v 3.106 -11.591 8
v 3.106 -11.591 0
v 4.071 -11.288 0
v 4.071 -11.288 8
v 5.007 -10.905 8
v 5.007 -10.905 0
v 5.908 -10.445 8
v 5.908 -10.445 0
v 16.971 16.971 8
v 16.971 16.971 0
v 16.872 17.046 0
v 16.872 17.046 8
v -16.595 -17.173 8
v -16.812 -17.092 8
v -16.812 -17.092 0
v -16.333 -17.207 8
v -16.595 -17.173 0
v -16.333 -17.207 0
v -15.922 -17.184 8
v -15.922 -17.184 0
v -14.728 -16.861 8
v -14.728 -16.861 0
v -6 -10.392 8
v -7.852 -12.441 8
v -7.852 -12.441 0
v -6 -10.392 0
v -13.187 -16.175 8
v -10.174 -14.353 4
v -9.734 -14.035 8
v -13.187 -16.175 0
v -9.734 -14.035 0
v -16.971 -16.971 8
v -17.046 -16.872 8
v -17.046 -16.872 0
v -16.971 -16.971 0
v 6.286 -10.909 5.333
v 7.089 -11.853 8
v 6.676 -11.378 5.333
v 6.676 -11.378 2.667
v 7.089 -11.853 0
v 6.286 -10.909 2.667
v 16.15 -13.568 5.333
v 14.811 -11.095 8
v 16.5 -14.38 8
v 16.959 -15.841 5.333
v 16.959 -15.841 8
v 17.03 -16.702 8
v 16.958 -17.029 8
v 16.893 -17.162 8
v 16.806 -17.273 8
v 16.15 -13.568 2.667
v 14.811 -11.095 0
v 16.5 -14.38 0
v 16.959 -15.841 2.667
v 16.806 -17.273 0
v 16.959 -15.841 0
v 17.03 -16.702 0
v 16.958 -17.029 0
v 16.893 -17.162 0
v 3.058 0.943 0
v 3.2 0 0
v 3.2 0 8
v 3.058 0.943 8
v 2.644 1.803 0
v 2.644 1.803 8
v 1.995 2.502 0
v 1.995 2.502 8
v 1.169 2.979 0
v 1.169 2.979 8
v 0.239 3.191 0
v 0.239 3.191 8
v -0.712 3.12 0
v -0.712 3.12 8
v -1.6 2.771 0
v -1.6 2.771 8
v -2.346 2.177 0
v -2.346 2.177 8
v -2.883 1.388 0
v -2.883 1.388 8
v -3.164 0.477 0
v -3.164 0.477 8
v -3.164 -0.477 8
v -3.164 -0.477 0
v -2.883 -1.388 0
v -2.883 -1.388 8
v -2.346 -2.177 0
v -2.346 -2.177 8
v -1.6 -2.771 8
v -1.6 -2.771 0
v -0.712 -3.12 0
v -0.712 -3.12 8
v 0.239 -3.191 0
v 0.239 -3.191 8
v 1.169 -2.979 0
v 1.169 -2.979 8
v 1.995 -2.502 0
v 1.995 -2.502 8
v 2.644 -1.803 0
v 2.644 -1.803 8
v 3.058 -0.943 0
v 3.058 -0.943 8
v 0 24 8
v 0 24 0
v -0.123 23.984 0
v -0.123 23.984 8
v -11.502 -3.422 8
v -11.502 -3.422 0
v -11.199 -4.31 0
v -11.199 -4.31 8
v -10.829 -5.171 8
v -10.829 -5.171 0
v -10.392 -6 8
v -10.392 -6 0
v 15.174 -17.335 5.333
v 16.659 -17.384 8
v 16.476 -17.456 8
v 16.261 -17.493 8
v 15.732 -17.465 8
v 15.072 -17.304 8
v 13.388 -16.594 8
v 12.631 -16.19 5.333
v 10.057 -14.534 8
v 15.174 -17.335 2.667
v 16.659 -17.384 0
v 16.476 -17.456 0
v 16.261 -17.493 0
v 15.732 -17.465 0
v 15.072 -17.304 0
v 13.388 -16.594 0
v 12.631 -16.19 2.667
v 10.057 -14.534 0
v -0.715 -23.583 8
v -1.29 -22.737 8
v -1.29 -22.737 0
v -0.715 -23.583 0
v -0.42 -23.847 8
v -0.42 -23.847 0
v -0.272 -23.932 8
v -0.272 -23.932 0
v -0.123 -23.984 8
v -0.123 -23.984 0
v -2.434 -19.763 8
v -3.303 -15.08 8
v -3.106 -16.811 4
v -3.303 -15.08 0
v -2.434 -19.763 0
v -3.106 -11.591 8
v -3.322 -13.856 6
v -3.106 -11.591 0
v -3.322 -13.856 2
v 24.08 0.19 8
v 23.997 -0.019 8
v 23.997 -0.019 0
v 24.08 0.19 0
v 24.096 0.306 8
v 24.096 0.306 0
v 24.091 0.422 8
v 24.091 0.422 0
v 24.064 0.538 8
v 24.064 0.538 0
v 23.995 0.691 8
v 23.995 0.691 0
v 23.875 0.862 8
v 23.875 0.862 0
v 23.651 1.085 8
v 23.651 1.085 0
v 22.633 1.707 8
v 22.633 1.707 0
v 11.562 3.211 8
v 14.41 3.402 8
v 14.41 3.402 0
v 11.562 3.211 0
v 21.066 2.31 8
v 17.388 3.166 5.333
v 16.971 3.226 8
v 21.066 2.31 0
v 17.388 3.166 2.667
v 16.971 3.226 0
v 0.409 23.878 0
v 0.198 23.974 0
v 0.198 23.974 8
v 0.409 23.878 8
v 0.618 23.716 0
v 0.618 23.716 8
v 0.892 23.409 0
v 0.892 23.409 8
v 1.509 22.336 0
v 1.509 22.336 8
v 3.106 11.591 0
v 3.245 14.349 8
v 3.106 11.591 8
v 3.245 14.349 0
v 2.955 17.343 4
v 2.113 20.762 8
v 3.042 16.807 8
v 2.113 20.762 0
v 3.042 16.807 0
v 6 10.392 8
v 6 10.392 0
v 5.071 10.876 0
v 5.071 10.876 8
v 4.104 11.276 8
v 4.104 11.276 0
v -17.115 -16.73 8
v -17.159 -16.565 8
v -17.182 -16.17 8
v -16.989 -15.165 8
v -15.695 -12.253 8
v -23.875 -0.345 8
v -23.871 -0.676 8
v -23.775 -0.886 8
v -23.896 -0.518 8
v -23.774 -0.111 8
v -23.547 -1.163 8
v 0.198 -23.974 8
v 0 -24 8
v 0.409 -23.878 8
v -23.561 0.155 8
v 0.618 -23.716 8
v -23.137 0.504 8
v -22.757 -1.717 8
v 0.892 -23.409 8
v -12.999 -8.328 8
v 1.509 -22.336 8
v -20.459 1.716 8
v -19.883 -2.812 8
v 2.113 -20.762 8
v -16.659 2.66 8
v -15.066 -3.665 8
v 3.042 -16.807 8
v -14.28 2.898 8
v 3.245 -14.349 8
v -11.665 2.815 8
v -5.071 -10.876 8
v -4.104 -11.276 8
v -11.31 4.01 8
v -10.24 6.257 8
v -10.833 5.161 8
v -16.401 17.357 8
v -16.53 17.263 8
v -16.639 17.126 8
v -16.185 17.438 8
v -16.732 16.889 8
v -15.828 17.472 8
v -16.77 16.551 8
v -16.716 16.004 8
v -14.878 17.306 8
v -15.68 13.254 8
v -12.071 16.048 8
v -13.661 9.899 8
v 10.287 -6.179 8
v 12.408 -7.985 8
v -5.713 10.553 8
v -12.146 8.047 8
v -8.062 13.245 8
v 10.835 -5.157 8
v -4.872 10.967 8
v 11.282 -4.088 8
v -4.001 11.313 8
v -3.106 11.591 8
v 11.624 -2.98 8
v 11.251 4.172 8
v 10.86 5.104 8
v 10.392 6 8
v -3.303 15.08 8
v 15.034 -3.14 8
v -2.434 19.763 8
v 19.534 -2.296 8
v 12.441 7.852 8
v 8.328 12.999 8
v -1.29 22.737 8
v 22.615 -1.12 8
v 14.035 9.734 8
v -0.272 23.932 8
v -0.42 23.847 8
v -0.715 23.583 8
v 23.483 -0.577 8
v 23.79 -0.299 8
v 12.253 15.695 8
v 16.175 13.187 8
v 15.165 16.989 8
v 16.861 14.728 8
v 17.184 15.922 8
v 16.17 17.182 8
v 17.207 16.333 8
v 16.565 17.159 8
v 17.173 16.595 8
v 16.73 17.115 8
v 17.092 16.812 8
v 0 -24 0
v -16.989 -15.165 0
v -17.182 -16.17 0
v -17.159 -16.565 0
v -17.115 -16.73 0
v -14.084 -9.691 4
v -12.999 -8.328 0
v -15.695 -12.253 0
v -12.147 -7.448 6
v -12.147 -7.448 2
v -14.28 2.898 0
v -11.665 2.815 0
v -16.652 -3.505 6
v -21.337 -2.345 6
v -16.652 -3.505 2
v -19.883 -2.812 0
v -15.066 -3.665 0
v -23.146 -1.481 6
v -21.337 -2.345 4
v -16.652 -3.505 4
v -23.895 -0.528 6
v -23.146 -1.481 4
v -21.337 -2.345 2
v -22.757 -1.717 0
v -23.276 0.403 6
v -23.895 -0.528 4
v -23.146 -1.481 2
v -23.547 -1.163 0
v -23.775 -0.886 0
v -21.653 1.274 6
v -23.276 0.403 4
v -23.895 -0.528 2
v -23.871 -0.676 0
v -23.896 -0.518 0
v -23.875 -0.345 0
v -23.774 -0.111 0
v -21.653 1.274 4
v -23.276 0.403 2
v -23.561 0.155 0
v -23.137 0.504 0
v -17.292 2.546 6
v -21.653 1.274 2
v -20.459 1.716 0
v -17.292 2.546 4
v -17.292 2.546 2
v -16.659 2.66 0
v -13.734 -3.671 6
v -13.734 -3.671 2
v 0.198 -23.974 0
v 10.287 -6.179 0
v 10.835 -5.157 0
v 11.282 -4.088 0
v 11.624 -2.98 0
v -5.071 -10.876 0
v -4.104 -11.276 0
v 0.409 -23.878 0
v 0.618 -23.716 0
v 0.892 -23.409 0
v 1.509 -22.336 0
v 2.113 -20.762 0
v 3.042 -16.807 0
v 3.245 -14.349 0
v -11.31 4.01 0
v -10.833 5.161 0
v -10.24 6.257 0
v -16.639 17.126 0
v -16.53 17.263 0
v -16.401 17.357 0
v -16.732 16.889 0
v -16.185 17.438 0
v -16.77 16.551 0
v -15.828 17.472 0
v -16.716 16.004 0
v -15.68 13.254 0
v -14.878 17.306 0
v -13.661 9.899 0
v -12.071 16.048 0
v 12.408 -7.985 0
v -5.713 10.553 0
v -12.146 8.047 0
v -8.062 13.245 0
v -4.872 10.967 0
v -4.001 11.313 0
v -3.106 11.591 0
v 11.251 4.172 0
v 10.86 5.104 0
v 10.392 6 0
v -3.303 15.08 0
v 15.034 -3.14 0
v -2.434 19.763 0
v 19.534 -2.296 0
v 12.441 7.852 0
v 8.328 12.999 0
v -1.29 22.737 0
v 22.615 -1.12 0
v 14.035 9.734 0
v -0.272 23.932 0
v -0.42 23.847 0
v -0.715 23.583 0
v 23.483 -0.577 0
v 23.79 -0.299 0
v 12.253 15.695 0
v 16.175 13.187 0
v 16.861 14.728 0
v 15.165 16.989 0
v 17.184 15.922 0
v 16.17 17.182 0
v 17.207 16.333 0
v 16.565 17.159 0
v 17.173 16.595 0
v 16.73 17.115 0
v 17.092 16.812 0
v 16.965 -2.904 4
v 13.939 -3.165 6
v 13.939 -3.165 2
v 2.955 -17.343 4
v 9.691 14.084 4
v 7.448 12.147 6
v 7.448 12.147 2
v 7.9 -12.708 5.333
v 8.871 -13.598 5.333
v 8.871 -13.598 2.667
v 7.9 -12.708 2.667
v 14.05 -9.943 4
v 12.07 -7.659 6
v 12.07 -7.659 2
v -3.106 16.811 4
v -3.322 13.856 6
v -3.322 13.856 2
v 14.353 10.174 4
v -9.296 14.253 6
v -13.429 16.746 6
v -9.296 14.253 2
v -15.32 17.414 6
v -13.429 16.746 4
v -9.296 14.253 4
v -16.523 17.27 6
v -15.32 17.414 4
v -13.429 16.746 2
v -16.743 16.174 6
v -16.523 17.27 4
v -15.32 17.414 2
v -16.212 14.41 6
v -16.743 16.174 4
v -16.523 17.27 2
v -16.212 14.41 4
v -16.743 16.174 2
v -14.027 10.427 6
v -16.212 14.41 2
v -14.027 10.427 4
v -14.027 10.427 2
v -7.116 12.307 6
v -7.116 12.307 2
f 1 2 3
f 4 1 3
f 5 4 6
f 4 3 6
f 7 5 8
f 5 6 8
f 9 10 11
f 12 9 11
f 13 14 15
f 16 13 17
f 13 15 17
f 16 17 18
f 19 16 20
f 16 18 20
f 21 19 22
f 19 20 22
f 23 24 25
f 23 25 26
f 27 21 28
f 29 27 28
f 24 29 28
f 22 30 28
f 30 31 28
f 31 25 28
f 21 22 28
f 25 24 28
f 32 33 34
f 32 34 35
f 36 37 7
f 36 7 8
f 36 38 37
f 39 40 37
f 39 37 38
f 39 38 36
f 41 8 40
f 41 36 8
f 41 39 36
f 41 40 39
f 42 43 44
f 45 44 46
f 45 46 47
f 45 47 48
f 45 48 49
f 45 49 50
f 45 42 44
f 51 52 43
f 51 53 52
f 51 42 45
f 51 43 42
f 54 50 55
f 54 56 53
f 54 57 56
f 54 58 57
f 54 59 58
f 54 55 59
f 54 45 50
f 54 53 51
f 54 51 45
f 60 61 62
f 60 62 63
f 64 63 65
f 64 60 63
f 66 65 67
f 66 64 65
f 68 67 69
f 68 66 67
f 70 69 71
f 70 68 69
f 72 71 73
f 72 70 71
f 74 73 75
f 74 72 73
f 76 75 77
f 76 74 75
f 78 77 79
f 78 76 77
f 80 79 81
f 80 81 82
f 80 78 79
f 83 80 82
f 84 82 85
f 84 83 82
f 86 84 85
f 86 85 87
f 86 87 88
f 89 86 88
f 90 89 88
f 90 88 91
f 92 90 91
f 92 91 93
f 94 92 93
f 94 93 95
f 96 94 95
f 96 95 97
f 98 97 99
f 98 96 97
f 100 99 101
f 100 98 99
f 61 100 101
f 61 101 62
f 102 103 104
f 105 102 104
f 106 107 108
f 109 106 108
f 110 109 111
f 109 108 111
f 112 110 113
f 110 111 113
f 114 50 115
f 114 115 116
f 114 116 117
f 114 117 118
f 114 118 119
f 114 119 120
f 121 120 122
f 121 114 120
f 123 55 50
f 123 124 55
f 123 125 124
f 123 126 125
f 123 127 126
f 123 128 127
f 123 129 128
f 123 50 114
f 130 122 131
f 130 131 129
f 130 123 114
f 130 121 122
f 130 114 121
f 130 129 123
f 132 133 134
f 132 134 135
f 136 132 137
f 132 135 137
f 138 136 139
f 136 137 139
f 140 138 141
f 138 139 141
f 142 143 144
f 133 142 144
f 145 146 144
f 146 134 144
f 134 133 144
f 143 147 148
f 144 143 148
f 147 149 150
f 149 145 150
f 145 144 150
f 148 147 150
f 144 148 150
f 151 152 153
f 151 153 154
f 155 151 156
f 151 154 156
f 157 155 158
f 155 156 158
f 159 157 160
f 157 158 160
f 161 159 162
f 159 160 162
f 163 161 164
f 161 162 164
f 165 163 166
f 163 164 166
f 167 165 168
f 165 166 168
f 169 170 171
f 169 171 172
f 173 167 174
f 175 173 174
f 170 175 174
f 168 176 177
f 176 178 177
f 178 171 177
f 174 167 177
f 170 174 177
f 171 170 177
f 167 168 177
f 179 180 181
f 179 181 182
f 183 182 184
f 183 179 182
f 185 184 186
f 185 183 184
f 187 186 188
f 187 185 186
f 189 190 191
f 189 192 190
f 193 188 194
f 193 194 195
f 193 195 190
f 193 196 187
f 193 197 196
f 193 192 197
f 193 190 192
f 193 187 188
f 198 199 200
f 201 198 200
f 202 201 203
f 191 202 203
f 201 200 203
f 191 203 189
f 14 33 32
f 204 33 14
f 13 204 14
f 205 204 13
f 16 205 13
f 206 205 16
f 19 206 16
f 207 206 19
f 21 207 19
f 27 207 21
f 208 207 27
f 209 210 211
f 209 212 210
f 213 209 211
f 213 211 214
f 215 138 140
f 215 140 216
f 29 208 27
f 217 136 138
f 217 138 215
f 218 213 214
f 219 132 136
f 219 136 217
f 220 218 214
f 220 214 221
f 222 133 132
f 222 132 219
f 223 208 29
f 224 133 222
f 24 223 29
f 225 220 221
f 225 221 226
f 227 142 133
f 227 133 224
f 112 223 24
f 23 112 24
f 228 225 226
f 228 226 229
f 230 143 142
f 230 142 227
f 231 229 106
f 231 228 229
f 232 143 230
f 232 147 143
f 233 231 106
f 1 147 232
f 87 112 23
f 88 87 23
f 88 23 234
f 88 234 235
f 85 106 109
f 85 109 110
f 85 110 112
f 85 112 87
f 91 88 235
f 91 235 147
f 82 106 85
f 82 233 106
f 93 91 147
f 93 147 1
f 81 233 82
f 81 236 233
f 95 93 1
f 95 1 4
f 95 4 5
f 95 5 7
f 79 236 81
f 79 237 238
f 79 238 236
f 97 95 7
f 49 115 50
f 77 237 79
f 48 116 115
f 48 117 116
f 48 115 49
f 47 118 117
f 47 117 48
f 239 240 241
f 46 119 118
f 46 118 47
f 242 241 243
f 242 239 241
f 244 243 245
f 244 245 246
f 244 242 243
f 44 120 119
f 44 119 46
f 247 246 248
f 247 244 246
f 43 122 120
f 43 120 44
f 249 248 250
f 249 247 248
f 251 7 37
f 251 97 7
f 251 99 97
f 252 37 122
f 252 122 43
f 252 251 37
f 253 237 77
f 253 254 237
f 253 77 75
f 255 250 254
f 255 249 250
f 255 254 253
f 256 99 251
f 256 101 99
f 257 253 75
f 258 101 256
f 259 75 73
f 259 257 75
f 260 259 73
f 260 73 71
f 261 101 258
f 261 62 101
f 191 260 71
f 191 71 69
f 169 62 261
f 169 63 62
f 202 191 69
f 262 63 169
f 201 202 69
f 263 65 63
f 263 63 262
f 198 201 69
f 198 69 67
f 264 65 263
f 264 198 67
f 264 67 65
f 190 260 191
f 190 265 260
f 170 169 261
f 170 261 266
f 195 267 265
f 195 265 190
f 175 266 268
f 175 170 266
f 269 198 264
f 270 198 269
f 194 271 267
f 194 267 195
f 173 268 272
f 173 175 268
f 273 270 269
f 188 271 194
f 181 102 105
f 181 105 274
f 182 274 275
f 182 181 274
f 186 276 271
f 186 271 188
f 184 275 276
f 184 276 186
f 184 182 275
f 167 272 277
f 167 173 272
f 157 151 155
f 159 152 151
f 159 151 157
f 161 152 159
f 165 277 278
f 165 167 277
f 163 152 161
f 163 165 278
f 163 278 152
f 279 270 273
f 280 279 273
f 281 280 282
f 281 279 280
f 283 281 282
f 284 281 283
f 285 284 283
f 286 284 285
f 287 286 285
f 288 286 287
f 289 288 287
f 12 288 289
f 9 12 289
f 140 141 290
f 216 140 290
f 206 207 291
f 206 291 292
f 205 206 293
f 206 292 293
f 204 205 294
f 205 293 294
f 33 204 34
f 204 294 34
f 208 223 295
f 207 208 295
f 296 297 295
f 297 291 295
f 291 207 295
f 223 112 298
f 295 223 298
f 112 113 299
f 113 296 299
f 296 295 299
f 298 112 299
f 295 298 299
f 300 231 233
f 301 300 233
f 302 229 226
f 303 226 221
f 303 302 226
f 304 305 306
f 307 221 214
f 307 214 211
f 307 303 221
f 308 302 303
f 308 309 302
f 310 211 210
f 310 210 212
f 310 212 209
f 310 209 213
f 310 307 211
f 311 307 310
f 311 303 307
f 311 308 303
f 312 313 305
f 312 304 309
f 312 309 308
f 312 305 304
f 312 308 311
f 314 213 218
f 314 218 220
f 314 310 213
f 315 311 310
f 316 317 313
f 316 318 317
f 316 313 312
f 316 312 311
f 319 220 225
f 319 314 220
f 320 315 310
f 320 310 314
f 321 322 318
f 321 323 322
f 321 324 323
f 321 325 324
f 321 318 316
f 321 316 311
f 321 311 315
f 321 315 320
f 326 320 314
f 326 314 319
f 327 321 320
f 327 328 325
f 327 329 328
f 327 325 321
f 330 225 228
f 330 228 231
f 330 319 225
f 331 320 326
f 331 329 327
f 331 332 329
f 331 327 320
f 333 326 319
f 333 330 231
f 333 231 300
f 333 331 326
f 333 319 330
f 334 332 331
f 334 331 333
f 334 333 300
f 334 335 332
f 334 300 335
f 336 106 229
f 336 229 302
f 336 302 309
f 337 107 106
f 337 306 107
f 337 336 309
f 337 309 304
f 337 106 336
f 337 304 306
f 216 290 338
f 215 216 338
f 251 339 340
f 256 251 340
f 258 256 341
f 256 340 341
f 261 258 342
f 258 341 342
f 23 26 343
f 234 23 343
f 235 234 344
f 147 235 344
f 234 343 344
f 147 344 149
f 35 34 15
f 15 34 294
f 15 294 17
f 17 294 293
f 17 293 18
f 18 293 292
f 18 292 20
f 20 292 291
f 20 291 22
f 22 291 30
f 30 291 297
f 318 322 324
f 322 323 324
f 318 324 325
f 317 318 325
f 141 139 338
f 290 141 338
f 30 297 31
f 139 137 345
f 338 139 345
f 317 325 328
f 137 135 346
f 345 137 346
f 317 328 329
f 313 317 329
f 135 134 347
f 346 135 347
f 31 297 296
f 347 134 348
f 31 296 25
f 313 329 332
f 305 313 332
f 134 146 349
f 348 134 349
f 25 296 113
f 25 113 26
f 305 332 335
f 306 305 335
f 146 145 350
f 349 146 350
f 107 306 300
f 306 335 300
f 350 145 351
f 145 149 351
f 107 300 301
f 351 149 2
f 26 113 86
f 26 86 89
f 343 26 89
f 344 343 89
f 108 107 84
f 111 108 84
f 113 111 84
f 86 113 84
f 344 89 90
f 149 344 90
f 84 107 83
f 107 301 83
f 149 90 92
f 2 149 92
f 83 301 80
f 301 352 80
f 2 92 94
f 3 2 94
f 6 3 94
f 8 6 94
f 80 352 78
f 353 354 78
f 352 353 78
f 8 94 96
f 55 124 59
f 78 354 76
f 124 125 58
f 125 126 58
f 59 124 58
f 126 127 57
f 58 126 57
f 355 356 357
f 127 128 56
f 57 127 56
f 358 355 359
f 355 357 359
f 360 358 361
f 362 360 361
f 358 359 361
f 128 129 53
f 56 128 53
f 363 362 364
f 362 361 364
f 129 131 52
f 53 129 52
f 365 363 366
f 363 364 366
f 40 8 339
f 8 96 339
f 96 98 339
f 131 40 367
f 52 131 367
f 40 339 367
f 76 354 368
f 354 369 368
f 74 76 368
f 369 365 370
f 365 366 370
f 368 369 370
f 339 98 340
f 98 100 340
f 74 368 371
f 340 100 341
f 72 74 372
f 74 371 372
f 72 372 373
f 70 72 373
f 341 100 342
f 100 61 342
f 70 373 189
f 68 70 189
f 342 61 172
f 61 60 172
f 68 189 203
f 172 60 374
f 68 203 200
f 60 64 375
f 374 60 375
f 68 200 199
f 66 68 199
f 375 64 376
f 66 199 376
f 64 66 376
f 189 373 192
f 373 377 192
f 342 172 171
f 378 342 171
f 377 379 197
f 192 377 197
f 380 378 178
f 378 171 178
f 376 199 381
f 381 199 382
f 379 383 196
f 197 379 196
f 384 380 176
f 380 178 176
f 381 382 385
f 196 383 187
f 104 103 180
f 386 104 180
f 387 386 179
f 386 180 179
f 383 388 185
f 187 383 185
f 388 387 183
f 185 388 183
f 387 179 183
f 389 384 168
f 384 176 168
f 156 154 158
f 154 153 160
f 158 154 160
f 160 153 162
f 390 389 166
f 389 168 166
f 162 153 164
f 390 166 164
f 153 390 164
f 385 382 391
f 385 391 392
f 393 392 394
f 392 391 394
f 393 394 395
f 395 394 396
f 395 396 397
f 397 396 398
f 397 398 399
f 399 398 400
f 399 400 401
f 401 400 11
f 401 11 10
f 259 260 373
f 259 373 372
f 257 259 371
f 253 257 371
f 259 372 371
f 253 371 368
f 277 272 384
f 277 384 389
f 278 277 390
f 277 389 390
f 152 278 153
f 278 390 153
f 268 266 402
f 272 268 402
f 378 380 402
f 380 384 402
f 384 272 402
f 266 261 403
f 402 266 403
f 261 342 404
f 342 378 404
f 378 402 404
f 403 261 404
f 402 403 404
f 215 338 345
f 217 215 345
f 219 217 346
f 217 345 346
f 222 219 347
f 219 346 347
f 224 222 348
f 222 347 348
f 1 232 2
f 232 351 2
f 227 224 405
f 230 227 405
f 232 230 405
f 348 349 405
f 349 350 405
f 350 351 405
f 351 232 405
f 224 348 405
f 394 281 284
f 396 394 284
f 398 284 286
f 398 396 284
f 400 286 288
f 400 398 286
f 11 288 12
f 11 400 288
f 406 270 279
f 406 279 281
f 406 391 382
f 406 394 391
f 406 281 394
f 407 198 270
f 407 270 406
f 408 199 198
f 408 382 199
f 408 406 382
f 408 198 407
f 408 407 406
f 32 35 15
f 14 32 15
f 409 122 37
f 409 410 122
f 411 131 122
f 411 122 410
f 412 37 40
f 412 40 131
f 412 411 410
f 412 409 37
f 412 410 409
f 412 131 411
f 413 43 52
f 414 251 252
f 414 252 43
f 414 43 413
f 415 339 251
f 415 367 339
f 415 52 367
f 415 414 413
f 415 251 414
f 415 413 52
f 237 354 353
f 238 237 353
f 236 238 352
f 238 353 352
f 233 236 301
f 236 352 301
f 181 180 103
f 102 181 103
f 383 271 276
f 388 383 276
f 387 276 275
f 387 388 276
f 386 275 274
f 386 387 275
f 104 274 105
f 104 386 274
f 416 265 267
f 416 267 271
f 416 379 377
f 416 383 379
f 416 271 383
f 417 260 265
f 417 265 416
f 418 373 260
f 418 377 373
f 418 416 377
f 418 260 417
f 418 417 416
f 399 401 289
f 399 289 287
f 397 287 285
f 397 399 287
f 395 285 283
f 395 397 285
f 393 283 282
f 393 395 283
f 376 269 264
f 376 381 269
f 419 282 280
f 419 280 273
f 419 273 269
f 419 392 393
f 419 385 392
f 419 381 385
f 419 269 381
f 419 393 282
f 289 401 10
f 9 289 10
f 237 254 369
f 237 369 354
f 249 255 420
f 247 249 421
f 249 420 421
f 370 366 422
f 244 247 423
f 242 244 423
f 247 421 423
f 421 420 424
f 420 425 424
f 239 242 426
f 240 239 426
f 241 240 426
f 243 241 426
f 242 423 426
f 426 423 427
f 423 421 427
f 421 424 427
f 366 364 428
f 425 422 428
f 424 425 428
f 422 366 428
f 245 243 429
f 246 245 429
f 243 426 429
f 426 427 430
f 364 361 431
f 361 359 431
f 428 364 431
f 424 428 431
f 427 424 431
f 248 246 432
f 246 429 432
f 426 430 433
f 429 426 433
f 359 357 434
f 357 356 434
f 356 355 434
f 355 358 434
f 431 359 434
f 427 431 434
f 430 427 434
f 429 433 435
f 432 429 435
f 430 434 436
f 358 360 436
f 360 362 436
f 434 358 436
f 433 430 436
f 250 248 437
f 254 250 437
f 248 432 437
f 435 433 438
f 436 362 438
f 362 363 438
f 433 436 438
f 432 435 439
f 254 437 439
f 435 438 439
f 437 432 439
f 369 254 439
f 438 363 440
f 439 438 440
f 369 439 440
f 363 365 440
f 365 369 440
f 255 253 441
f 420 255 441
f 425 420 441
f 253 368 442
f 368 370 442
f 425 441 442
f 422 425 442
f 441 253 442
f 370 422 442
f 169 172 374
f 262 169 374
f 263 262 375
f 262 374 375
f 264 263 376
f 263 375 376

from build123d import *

# Parameters (mm, degrees)
F1_DEPTH = 8
F2_R     = 3.2
F3_DEPTH = 8


with BuildPart() as f1:
    # F0 (on Top) → F1 (new body)
    with BuildSketch(Plane.XY):
        with BuildLine():
            ThreePointArc((11.624215505, -2.9795324957), (11.905683224, -1.5015681703), (12, 0))
            ThreePointArc((12, 0), (11.8901027427, 1.6203261298), (11.5624238722, 3.2109740268))
            ThreePointArc((11.5624238722, 3.2109740268), (11.0655860548, 4.6424998939), (10.3923048454, 6))
            ThreePointArc((10.3923048454, 6), (8.4852813742, 8.4852813742), (6, 10.3923048454))
            ThreePointArc((6, 10.3923048454), (4.5922011884, 11.0865543901), (3.1058285412, 11.5911099155))
            ThreePointArc((3.1058285412, 11.5911099155), (0, 12), (-3.1058285412, 11.5911099155))
            ThreePointArc((-3.1058285412, 11.5911099155), (-4.4398668676, 11.1484340693), (-5.7129920656, 10.5528063404))
            ThreePointArc((-5.7129920656, 10.5528063404), (-8.2605500909, 8.7042123248), (-10.2397735662, 6.25675933))
            ThreePointArc((-10.2397735662, 6.25675933), (-11.0868366823, 4.5915196156), (-11.6651564764, 2.8149821281))
            ThreePointArc((-11.6651564764, 2.8149821281), (-11.9958792367, -0.3144540322), (-11.5016563593, -3.4222654765))
            ThreePointArc((-11.5016563593, -3.4222654765), (-11.0225933032, -4.7436733522), (-10.3923048454, -6))
            ThreePointArc((-10.3923048454, -6), (-8.4852813742, -8.4852813742), (-6, -10.3923048454))
            ThreePointArc((-6, -10.3923048454), (-4.5922011884, -11.0865543901), (-3.1058285412, -11.5911099155))
            ThreePointArc((-3.1058285412, -11.5911099155), (0, -12), (3.1058285412, -11.5911099155))
            ThreePointArc((3.1058285412, -11.5911099155), (4.5432719603, -11.1066952733), (5.908120799, -10.4448125222))
            ThreePointArc((5.908120799, -10.4448125222), (8.3736459378, -8.5954670442), (10.2868074238, -6.1791255875))
            ThreePointArc((10.2868074238, -6.1791255875), (11.0717017858, -4.6278958032), (11.624215505, -2.9795324957))
        make_face()
        with BuildLine():
            ThreePointArc((11.5624238722, 3.2109740268), (11.8901027427, 1.6203261298), (12, 0))
            ThreePointArc((12, 0), (11.905683224, -1.5015681703), (11.624215505, -2.9795324957))
            add(Edge.make_bspline(
                [(11.624215505, -2.9795324957), (13.0711119373, -3.1474625085), (16.2215938385, -3.5354098028), (23.3430398074, -1.2147893088), (23.9974502807, -0.0193380728)],
                knots=[0, 0, 0, 0, 0.2260964002, 0.4754769354, 0.4754769354, 0.4754769354, 0.4754769354], degree=3))
            add(Edge.make_bspline(
                [(23.9974502807, -0.0193380728), (24.0614185813, 0.0975166951), (24.4699625306, 1.4775409149), (16.7275018212, 3.7524414462), (13.1935231835, 3.38198653), (11.5624238722, 3.2109740268)],
                knots=[0.4754769354, 0.4754769354, 0.4754769354, 0.4754769354, 0.4998537595, 0.763872081, 1, 1, 1, 1], degree=3))
        make_face()
        with BuildLine():
            ThreePointArc((6, 10.3923048454), (8.4852813742, 8.4852813742), (10.3923048454, 6))
            add(Edge.make_bspline(
                [(17.0919170156, 16.8124119108), (17.6837825023, 15.7350104435), (14.233378626, 9.2275146766), (11.6451903674, 7.0527541624), (10.3923048454, 6)],
                knots=[0.5132748066, 0.5132748066, 0.5132748066, 0.5132748066, 0.7643869429, 1, 1, 1, 1], degree=3))
            Line((17.0919170156, 16.8124119108), (16.9705629685, 16.9705635618))
            Line((16.9705629685, 16.9705635618), (16.8722269652, 17.046019431))
            add(Edge.make_bspline(
                [(6, 10.3923048454), (6.8772705646, 11.5415832454), (8.7951195762, 14.0540834163), (15.7764959515, 17.7301129885), (16.8722269652, 17.046019431)],
                knots=[0, 0, 0, 0, 0.2244243513, 0.4906263104, 0.4906263104, 0.4906263104, 0.4906263104], degree=3))
        make_face()
        with BuildLine():
            add(Edge.make_bspline(
                [(10.2868074238, -6.1791255875), (11.4270677634, -7.0822286351), (12.865925877, -8.1262783159), (14.5581234006, -10.6857585266), (14.8109868504, -11.0946847194)],
                knots=[0, 0, 0, 0, 0.2257806982, 0.2662434003, 0.2662434003, 0.2662434003, 0.2662434003], degree=3))
            ThreePointArc((10.2868074238, -6.1791255875), (8.3736459378, -8.5954670442), (5.908120799, -10.4448125222))
            add(Edge.make_bspline(
                [(7.0890186874, -11.8532565288), (6.6610674582, -11.3742973278), (6.2831423621, -10.9076828022), (5.908120799, -10.4448125222)],
                knots=[0.9142291133, 0.9142291133, 0.9142291133, 0.9142291133, 1, 1, 1, 1], degree=3))
            add(Edge.make_bspline(
                [(10.0568733092, -14.5338657298), (8.7441655127, -13.5714120718), (7.8396400458, -12.6933452624), (7.0890186874, -11.8532565288)],
                knots=[0.7637879996, 0.7637879996, 0.7637879996, 0.7637879996, 0.9142291133, 0.9142291133, 0.9142291133, 0.9142291133], degree=3))
            add(Edge.make_bspline(
                [(16.8059917931, -17.2725248103), (15.9222786098, -18.1709296498), (12.3524907209, -16.2134042482), (10.0568733491, -14.5338657589)],
                knots=[0.50038259, 0.50038259, 0.50038259, 0.50038259, 0.7648987347, 0.7648987347, 0.7648987347, 0.7648987347], degree=3))
            add(Edge.make_bspline(
                [(14.8109868504, -11.0946847194), (16.2696513341, -13.4536105124), (17.584874947, -16.4762614942), (16.8059918085, -17.2725247947)],
                knots=[0.2662434003, 0.2662434003, 0.2662434003, 0.2662434003, 0.4996559651, 0.4996559651, 0.4996559651, 0.4996559651], degree=3))
        make_face()
        with BuildLine():
            ThreePointArc((-3.1058285412, 11.5911099155), (0, 12), (3.1058285412, 11.5911099155))
            add(Edge.make_bspline(
                [(0.1976441975, 23.9739796614), (1.3779926102, 23.6306464061), (3.5396801636, 16.5893546652), (3.2473427828, 13.2214433713), (3.1058285412, 11.5911099155)],
                knots=[0.5132751075, 0.5132751075, 0.5132751075, 0.5132751075, 0.7643869429, 1, 1, 1, 1], degree=3))
            Line((0.1976441975, 23.9739796614), (0, 24))
            Line((0, 24), (-0.1228977193, 23.9838202083))
            add(Edge.make_bspline(
                [(-3.1058285412, 11.5911099155), (-3.2981671262, 13.0240964307), (-3.7186485167, 16.1568228295), (-1.3814211537, 23.6927333107), (-0.1228977193, 23.9838202083)],
                knots=[0, 0, 0, 0, 0.2244243513, 0.4906257542, 0.4906257542, 0.4906257542, 0.4906257542], degree=3))
        make_face()
        with BuildLine():
            add(Edge.make_bspline(
                [(0.1976441576, -23.973979673), (1.377992585, -23.6306464881), (3.5396801653, -16.5893546847), (3.2473427828, -13.2214433713), (3.1058285412, -11.5911099155)],
                knots=[0.5132751047, 0.5132751047, 0.5132751047, 0.5132751047, 0.7643869429, 1, 1, 1, 1], degree=3))
            ThreePointArc((3.1058285412, -11.5911099155), (0, -12), (-3.1058285412, -11.5911099155))
            add(Edge.make_bspline(
                [(-3.1058285412, -11.5911099155), (-3.2981671262, -13.0240964307), (-3.7186490047, -16.1568264655), (-1.3814157282, -23.6927508039), (-0.1228896428, -23.9838220763)],
                knots=[0, 0, 0, 0, 0.2244243513, 0.4906263236, 0.4906263236, 0.4906263236, 0.4906263236], degree=3))
            Line((-0.1228896428, -23.9838220763), (-4.148e-07, -24.0000007501))
            Line((-4.148e-07, -24.0000007501), (0.1976441576, -23.973979673))
        make_face()
        with BuildLine():
            ThreePointArc((-10.2397735662, 6.25675933), (-8.2605500909, 8.7042123248), (-5.7129920656, 10.5528063404))
            add(Edge.make_bspline(
                [(-5.7129920656, 10.5528063404), (-6.5580524828, 11.7016423726), (-8.4819019469, 14.2776873778), (-19.355634282, 20.2151241331), (-13.9818005189, 9.5546934951), (-11.4637192896, 7.323104241), (-10.2397735662, 6.25675933)],
                knots=[0.0036068796, 0.0036068796, 0.0036068796, 0.0036068796, 0.2249803905, 0.5005320337, 0.7662808066, 1, 1, 1, 1], degree=3))
        make_face()
        with BuildLine():
            add(Edge.make_bspline(
                [(-16.8124081104, -17.0919191033), (-15.7350025484, -17.6837783162), (-9.2275133574, -14.233377056), (-7.0527541624, -11.6451903674), (-6, -10.3923048454)],
                knots=[0.5132751019, 0.5132751019, 0.5132751019, 0.5132751019, 0.7643869429, 1, 1, 1, 1], degree=3))
            ThreePointArc((-6, -10.3923048454), (-8.4852813742, -8.4852813742), (-10.3923048454, -6))
            add(Edge.make_bspline(
                [(-10.3923048454, -6), (-11.5415832454, -6.8772705646), (-14.0540805975, -8.7951174246), (-17.7301047401, -15.7764802864), (-17.0460236746, -16.8722201681)],
                knots=[0, 0, 0, 0, 0.2244243513, 0.4906257599, 0.4906257599, 0.4906257599, 0.4906257599], degree=3))
            Line((-17.0460236746, -16.8722201681), (-16.9705627437, -16.9705627678))
            Line((-16.9705627437, -16.9705627678), (-16.8124081104, -17.0919191033))
        make_face()
        with BuildLine():
            ThreePointArc((-11.5016563593, -3.4222654765), (-11.9958792367, -0.3144540322), (-11.6651564764, 2.8149821281))
            add(Edge.make_bspline(
                [(-11.5016563593, -3.4222654765), (-12.9115656206, -3.6370683177), (-16.0934458137, -4.0981863914), (-27.9807827448, -0.6079790505), (-16.6428417959, 3.1311619375), (-13.2845908531, 2.9264195891), (-11.6651564764, 2.8149821281)],
                knots=[0.0036068808, 0.0036068808, 0.0036068808, 0.0036068808, 0.2249823253, 0.5005363381, 0.7662873964, 1, 1, 1, 1], degree=3))
        make_face()
    extrude(amount=F1_DEPTH)

    # F2 (on Top) → F3 (cut)
    with BuildSketch(Plane.XY):
        Circle(F2_R)
    extrude(amount=F3_DEPTH, mode=Mode.SUBTRACT)


solid = f1.part
